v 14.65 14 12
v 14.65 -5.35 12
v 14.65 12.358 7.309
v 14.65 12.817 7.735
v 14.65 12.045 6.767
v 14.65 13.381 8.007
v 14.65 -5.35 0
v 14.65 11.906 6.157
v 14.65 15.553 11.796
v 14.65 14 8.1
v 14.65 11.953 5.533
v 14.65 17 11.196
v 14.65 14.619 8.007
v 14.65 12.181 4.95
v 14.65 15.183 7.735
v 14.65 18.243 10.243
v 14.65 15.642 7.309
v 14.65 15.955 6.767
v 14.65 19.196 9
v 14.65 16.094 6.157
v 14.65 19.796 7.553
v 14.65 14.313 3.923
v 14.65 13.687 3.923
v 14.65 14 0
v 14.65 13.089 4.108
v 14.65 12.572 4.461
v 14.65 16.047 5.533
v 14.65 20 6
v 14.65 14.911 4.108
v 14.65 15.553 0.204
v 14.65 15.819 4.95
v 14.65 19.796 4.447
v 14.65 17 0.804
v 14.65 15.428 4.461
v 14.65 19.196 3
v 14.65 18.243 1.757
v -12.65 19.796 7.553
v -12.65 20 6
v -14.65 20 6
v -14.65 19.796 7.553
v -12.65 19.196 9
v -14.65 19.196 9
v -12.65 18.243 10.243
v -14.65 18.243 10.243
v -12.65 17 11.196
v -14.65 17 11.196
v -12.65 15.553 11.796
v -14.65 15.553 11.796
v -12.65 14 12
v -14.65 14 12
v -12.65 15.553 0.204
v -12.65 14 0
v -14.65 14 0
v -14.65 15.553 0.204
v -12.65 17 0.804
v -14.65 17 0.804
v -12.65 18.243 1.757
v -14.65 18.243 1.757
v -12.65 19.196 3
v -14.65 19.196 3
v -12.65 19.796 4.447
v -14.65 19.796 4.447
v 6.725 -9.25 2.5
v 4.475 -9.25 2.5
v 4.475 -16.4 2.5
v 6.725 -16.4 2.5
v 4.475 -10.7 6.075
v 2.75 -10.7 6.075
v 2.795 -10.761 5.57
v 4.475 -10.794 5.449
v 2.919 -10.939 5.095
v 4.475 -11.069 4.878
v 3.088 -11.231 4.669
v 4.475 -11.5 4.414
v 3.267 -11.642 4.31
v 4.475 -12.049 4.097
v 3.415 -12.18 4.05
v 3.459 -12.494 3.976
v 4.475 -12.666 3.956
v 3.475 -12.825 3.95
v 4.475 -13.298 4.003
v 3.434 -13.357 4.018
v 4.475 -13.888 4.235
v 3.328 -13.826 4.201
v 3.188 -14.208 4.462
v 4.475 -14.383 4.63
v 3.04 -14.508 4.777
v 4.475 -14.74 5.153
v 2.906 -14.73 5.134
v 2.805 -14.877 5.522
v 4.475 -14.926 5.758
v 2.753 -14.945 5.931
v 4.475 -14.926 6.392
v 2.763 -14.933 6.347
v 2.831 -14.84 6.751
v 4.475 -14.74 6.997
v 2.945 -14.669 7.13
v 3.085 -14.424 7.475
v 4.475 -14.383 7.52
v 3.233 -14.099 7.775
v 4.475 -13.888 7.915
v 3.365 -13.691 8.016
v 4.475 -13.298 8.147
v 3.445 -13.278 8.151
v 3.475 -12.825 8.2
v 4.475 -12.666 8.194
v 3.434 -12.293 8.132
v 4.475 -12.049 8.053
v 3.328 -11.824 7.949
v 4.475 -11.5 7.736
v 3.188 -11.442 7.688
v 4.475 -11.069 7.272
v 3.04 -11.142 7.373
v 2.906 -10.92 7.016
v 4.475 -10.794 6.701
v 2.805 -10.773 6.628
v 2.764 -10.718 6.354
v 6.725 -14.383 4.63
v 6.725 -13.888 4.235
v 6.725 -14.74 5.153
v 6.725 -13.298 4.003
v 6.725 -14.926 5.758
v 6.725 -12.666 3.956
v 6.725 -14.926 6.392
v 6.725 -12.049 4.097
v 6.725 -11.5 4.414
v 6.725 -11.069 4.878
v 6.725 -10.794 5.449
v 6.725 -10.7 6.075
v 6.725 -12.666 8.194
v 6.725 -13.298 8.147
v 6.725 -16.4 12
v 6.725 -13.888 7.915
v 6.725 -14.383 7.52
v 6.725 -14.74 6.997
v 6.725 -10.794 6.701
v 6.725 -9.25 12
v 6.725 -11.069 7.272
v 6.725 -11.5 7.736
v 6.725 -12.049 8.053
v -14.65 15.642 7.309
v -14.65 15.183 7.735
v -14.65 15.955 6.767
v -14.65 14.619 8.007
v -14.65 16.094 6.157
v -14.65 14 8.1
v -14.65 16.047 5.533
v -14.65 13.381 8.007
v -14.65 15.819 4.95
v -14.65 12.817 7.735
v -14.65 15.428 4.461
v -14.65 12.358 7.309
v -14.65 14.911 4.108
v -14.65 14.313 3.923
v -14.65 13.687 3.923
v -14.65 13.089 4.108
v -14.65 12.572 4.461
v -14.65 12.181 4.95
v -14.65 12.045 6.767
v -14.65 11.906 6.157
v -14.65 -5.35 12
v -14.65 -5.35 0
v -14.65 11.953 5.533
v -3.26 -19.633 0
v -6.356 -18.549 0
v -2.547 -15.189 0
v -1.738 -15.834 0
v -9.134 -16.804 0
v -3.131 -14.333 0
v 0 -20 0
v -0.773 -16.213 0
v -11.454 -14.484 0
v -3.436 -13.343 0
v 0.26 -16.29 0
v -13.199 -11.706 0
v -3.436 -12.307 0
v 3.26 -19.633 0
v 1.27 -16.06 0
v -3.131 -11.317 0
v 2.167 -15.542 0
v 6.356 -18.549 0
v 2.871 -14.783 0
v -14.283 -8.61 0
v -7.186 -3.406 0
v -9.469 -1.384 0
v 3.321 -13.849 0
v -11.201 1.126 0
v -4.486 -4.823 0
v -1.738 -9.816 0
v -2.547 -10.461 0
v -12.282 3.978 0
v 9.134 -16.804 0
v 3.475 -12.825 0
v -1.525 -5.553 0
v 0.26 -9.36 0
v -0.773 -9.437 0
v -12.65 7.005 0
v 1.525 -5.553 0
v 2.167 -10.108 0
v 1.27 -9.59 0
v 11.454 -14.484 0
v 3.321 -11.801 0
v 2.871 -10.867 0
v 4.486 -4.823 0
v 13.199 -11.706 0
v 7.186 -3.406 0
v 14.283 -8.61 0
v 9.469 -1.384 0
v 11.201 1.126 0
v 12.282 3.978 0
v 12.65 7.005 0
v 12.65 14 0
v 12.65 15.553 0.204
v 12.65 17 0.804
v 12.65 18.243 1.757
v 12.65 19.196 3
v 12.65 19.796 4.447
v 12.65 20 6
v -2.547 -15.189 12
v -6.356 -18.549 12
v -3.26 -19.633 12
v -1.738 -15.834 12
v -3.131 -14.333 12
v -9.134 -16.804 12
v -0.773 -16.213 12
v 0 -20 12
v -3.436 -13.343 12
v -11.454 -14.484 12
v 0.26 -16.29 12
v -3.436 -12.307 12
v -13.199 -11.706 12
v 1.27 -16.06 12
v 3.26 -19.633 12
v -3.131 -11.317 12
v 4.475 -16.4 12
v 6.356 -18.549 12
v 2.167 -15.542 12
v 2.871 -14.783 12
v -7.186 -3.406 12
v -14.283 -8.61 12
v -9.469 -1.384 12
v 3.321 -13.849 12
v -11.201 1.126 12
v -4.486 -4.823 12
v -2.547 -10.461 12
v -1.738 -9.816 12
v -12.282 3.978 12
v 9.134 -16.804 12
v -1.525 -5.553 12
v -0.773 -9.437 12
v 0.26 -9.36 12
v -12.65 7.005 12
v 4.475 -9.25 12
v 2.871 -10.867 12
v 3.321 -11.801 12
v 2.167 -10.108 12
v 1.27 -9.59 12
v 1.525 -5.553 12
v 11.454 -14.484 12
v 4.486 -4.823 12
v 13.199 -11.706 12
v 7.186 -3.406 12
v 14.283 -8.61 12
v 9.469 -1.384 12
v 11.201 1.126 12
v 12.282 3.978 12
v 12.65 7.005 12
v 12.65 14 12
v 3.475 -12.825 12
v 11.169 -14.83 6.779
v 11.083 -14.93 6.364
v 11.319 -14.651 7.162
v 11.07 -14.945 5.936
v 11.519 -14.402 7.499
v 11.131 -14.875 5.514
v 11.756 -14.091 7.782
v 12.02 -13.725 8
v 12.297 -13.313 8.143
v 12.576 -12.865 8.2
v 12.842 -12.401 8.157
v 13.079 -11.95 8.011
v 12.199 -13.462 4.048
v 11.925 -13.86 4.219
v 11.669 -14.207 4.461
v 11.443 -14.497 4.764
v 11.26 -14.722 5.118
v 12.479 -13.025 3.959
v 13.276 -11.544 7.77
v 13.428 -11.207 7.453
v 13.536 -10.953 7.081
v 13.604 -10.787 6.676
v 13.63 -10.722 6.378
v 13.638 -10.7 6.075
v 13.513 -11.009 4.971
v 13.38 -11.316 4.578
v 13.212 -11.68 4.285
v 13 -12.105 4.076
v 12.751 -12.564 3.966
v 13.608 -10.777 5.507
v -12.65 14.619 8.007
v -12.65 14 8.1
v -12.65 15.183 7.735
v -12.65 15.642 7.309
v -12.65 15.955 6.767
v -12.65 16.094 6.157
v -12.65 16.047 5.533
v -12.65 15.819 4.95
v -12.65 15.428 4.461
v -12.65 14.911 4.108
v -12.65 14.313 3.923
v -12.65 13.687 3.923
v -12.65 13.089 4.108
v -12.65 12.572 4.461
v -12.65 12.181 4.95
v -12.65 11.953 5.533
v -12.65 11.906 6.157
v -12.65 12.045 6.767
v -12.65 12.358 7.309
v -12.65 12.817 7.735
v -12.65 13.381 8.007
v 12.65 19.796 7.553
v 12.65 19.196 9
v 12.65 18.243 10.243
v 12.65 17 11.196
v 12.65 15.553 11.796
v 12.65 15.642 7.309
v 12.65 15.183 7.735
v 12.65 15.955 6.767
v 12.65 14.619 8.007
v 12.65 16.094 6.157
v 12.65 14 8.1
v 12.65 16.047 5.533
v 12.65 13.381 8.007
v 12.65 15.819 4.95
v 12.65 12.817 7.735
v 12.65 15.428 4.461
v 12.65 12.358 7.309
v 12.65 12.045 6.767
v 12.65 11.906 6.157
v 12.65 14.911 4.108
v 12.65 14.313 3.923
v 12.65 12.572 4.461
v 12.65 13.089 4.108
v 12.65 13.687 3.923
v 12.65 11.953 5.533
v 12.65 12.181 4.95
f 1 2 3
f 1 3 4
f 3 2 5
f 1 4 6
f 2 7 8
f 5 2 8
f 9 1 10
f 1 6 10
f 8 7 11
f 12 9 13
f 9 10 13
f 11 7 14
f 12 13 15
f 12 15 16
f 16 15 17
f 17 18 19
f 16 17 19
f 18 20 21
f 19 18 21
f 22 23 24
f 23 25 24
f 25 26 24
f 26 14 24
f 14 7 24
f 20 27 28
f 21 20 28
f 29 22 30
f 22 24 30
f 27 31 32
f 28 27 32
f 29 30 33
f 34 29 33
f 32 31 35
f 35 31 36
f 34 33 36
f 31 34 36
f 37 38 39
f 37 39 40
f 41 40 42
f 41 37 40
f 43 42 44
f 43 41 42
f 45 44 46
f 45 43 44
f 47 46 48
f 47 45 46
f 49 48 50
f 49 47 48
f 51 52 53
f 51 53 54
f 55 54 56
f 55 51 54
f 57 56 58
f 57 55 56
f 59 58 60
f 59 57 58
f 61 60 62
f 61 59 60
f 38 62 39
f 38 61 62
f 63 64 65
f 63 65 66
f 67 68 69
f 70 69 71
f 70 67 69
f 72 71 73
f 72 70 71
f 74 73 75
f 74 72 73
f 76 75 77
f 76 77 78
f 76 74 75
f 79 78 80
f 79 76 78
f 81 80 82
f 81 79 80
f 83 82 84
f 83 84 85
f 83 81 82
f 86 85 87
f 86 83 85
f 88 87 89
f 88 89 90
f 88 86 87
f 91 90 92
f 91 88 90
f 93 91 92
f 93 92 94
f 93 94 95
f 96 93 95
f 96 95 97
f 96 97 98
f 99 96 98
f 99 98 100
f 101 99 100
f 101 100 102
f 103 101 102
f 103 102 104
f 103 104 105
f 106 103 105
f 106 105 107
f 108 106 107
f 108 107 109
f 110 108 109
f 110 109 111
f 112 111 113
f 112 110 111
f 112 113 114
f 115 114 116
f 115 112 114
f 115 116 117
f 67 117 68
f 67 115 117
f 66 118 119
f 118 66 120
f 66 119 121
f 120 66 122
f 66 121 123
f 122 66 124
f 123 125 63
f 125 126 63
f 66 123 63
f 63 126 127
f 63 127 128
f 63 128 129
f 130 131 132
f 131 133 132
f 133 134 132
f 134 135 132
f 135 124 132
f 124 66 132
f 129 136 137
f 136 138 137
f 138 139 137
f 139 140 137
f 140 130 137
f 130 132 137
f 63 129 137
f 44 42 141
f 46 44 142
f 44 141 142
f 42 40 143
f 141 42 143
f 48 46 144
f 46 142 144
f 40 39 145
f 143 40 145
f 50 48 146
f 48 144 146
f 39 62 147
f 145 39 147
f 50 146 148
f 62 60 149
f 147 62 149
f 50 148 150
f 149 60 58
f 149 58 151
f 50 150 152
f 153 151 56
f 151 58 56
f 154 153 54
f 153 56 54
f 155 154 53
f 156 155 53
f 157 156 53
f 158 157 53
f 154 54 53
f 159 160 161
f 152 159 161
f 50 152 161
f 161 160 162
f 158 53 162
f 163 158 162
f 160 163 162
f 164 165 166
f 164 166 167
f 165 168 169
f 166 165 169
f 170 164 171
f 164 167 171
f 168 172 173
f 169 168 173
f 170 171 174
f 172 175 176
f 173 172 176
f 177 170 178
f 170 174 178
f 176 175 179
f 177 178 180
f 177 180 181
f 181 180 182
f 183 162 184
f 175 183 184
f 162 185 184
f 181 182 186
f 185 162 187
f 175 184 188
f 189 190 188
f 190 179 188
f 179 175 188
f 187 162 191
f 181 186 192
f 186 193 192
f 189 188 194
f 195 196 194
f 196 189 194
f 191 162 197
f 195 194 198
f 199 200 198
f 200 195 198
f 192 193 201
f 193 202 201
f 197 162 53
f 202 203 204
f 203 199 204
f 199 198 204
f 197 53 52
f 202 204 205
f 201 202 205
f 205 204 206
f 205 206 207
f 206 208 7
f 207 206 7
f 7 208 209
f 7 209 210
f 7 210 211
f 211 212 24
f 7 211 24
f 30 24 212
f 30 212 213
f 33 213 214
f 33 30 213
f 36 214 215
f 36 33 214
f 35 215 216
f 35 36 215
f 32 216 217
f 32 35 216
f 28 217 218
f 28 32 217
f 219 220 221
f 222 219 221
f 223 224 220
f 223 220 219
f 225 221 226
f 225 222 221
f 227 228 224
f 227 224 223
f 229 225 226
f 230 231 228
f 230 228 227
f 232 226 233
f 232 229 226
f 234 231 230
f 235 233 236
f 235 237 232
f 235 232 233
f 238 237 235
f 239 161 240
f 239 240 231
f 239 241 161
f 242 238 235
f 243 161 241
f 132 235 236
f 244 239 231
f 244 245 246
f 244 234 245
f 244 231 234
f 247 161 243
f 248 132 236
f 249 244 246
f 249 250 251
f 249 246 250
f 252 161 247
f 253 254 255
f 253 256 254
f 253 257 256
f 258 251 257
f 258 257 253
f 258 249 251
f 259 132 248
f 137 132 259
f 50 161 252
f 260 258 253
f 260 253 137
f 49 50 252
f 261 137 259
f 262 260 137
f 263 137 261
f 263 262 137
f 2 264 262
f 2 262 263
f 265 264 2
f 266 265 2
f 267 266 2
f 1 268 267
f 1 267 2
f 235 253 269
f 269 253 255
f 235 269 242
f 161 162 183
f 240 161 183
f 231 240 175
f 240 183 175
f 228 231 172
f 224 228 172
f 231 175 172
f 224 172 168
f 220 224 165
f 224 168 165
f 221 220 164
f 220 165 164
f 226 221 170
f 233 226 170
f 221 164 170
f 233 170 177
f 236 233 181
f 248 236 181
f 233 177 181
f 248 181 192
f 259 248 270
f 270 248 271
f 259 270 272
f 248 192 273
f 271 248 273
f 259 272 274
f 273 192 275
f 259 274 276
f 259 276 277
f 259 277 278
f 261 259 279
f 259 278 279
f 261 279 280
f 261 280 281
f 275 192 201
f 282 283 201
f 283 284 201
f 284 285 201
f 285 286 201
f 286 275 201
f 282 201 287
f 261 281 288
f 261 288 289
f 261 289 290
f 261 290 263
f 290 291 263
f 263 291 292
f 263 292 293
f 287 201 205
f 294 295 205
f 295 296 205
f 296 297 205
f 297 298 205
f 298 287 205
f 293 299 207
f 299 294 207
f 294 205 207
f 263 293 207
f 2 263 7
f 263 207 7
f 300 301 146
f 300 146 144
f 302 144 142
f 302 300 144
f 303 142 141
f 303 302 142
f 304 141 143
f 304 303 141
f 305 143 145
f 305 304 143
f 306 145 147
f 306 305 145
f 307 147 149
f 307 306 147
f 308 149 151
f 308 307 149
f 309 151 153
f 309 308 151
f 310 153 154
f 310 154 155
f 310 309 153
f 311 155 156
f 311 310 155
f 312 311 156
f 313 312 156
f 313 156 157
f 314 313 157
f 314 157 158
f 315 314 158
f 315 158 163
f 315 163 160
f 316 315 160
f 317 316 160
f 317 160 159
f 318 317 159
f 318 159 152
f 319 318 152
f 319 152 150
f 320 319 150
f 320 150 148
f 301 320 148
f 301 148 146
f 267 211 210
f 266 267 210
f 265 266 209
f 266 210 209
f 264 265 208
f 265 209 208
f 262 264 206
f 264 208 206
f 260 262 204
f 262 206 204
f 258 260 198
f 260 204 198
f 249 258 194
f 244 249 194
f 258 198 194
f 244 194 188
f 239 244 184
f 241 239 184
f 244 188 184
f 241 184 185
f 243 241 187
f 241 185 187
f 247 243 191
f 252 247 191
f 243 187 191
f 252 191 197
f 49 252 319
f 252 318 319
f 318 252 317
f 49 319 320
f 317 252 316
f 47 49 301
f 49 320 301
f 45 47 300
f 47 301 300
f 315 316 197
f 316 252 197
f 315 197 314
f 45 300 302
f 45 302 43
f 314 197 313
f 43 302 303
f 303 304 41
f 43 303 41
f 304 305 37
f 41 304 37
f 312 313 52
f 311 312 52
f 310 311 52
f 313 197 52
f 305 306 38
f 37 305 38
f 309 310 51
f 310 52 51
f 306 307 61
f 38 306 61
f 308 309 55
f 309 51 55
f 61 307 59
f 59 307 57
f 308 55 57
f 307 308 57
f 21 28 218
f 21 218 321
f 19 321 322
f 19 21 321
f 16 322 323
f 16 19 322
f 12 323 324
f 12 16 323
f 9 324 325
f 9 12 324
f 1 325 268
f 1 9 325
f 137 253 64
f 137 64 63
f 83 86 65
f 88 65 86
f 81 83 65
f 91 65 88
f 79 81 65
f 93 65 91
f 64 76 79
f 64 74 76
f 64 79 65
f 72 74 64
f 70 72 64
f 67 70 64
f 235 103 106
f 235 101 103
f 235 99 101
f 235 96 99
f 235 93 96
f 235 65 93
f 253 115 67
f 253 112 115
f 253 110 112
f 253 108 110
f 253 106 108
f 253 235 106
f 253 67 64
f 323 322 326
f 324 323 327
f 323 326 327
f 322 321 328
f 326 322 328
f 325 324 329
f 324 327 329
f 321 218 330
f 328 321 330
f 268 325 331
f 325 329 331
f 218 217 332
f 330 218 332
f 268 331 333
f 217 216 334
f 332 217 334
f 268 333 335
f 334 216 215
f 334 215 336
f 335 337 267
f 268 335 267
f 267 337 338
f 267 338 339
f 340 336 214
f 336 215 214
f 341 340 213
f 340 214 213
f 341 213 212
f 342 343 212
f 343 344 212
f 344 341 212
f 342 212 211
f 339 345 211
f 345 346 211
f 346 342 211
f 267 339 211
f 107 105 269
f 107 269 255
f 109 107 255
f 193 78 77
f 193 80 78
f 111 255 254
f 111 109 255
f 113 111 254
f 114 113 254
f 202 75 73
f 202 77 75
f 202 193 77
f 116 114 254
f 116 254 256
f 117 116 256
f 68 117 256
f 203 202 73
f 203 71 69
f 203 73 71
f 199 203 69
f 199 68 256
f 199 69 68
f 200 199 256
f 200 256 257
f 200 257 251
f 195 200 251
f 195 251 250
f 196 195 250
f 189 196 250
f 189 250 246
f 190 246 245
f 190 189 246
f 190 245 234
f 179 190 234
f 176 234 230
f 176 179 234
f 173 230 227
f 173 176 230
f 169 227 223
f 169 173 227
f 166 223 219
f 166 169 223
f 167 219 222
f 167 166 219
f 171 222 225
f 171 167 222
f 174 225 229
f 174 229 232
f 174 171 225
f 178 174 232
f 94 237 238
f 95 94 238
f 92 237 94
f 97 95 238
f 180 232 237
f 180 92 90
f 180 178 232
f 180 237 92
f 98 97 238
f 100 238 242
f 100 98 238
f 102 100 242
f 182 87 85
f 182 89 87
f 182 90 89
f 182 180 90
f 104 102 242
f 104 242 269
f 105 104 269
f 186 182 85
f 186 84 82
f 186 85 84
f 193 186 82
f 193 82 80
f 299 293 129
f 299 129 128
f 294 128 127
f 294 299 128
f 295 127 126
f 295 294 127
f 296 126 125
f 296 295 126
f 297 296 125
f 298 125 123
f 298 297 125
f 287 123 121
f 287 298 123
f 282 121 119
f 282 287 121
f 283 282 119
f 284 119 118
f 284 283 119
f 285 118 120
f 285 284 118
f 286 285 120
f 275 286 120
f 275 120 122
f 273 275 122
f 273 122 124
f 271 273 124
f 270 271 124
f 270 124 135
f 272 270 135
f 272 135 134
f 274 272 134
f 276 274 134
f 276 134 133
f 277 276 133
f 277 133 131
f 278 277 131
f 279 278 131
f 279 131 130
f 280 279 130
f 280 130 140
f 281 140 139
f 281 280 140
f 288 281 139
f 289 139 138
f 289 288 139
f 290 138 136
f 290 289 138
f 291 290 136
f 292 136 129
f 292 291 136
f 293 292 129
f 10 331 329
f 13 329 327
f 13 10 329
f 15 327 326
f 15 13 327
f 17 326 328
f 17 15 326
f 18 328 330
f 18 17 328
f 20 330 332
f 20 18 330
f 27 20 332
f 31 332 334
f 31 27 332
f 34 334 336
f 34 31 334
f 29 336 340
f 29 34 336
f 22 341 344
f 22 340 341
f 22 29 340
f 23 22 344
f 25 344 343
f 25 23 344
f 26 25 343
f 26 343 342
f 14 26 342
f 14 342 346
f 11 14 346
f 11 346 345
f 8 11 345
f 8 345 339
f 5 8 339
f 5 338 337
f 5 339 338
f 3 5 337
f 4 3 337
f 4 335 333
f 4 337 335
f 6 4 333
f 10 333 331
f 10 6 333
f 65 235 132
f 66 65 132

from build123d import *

# Parameters (mm, degrees)
SKETCH1_R               = 3.475
BOSS_EXTRUDE1_DEPTH     = 12
CUT_EXTRUDE3_START      = -29.3
CUT_EXTRUDE3_OUTLINE_R  = 2.1
CUT_EXTRUDE3_DEPTH      = 29.3
SKETCH3_W               = 2.25
SKETCH3_H               = 7.15
CUT_EXTRUDE4_DEPTH      = 9.5
CUT_EXTRUDE6_DEPTH      = 7.2
CUT_EXTRUDE6_DEPTH_BACK = 11.2
SKETCH4_R               = 2.125


# Read off the part's stored shape, not the designer's step: Cut-Extrude3
with BuildPart() as part:
    # Sketch1 → Boss-Extrude1 (new body)
    with BuildSketch(Plane.XY):
        with BuildLine():
            Line((-14.65, 20), (-14.65, -5.35))
            ThreePointArc((-14.65, -5.35), (0, -20), (14.65, -5.35))
            Line((14.65, -5.35), (14.65, 20))
            Line((14.65, 20), (12.65, 20))
            Line((12.65, 20), (12.65, 7.005))
            ThreePointArc((12.65, 7.005), (0, -5.645), (-12.65, 7.005))
            Line((-12.65, 7.005), (-12.65, 20))
            Line((-12.65, 20), (-14.65, 20))
        make_face()
        with Locations((0, -12.825)):
            Circle(SKETCH1_R, mode=Mode.SUBTRACT)
    extrude(amount=BOSS_EXTRUDE1_DEPTH)

    # Cut-Extrude3 outline → Cut-Extrude3 (cut)
    with BuildSketch(Plane.ZY.offset(14.65).offset(CUT_EXTRUDE3_START)):
        with BuildLine():
            ThreePointArc((0, 14), (1.757359313, 18.242640687), (6, 20))
            Line((6, 20), (0, 20))
            Line((0, 20), (0, 14))
        make_face()
        with BuildLine():
            ThreePointArc((6, 20), (10.242640687, 18.242640687), (12, 14))
            Line((12, 14), (12, 20))
            Line((12, 20), (6, 20))
        make_face()
        with Locations((6, 14)):
            Circle(CUT_EXTRUDE3_OUTLINE_R)
    extrude(amount=CUT_EXTRUDE3_DEPTH, mode=Mode.SUBTRACT)

    # Sketch3 → Cut-Extrude4 (cut)
    with BuildSketch(Plane.XY.offset(12)):
        with Locations((5.6, -12.825)):
            Rectangle(SKETCH3_W, SKETCH3_H)
    extrude(amount=-CUT_EXTRUDE4_DEPTH, mode=Mode.SUBTRACT)

    # Sketch4 → Cut-Extrude6 (cut, two sides: drawn at the far end of the back side and taken through both)
    with BuildSketch(Plane.ZY.offset(-6.725).offset(-CUT_EXTRUDE6_DEPTH_BACK)):
        with Locations(Location((6.075, -12.825, 0), (0, 0, 90))):
            Circle(SKETCH4_R)
    extrude(amount=CUT_EXTRUDE6_DEPTH + CUT_EXTRUDE6_DEPTH_BACK, mode=Mode.SUBTRACT)


solid = part.part
